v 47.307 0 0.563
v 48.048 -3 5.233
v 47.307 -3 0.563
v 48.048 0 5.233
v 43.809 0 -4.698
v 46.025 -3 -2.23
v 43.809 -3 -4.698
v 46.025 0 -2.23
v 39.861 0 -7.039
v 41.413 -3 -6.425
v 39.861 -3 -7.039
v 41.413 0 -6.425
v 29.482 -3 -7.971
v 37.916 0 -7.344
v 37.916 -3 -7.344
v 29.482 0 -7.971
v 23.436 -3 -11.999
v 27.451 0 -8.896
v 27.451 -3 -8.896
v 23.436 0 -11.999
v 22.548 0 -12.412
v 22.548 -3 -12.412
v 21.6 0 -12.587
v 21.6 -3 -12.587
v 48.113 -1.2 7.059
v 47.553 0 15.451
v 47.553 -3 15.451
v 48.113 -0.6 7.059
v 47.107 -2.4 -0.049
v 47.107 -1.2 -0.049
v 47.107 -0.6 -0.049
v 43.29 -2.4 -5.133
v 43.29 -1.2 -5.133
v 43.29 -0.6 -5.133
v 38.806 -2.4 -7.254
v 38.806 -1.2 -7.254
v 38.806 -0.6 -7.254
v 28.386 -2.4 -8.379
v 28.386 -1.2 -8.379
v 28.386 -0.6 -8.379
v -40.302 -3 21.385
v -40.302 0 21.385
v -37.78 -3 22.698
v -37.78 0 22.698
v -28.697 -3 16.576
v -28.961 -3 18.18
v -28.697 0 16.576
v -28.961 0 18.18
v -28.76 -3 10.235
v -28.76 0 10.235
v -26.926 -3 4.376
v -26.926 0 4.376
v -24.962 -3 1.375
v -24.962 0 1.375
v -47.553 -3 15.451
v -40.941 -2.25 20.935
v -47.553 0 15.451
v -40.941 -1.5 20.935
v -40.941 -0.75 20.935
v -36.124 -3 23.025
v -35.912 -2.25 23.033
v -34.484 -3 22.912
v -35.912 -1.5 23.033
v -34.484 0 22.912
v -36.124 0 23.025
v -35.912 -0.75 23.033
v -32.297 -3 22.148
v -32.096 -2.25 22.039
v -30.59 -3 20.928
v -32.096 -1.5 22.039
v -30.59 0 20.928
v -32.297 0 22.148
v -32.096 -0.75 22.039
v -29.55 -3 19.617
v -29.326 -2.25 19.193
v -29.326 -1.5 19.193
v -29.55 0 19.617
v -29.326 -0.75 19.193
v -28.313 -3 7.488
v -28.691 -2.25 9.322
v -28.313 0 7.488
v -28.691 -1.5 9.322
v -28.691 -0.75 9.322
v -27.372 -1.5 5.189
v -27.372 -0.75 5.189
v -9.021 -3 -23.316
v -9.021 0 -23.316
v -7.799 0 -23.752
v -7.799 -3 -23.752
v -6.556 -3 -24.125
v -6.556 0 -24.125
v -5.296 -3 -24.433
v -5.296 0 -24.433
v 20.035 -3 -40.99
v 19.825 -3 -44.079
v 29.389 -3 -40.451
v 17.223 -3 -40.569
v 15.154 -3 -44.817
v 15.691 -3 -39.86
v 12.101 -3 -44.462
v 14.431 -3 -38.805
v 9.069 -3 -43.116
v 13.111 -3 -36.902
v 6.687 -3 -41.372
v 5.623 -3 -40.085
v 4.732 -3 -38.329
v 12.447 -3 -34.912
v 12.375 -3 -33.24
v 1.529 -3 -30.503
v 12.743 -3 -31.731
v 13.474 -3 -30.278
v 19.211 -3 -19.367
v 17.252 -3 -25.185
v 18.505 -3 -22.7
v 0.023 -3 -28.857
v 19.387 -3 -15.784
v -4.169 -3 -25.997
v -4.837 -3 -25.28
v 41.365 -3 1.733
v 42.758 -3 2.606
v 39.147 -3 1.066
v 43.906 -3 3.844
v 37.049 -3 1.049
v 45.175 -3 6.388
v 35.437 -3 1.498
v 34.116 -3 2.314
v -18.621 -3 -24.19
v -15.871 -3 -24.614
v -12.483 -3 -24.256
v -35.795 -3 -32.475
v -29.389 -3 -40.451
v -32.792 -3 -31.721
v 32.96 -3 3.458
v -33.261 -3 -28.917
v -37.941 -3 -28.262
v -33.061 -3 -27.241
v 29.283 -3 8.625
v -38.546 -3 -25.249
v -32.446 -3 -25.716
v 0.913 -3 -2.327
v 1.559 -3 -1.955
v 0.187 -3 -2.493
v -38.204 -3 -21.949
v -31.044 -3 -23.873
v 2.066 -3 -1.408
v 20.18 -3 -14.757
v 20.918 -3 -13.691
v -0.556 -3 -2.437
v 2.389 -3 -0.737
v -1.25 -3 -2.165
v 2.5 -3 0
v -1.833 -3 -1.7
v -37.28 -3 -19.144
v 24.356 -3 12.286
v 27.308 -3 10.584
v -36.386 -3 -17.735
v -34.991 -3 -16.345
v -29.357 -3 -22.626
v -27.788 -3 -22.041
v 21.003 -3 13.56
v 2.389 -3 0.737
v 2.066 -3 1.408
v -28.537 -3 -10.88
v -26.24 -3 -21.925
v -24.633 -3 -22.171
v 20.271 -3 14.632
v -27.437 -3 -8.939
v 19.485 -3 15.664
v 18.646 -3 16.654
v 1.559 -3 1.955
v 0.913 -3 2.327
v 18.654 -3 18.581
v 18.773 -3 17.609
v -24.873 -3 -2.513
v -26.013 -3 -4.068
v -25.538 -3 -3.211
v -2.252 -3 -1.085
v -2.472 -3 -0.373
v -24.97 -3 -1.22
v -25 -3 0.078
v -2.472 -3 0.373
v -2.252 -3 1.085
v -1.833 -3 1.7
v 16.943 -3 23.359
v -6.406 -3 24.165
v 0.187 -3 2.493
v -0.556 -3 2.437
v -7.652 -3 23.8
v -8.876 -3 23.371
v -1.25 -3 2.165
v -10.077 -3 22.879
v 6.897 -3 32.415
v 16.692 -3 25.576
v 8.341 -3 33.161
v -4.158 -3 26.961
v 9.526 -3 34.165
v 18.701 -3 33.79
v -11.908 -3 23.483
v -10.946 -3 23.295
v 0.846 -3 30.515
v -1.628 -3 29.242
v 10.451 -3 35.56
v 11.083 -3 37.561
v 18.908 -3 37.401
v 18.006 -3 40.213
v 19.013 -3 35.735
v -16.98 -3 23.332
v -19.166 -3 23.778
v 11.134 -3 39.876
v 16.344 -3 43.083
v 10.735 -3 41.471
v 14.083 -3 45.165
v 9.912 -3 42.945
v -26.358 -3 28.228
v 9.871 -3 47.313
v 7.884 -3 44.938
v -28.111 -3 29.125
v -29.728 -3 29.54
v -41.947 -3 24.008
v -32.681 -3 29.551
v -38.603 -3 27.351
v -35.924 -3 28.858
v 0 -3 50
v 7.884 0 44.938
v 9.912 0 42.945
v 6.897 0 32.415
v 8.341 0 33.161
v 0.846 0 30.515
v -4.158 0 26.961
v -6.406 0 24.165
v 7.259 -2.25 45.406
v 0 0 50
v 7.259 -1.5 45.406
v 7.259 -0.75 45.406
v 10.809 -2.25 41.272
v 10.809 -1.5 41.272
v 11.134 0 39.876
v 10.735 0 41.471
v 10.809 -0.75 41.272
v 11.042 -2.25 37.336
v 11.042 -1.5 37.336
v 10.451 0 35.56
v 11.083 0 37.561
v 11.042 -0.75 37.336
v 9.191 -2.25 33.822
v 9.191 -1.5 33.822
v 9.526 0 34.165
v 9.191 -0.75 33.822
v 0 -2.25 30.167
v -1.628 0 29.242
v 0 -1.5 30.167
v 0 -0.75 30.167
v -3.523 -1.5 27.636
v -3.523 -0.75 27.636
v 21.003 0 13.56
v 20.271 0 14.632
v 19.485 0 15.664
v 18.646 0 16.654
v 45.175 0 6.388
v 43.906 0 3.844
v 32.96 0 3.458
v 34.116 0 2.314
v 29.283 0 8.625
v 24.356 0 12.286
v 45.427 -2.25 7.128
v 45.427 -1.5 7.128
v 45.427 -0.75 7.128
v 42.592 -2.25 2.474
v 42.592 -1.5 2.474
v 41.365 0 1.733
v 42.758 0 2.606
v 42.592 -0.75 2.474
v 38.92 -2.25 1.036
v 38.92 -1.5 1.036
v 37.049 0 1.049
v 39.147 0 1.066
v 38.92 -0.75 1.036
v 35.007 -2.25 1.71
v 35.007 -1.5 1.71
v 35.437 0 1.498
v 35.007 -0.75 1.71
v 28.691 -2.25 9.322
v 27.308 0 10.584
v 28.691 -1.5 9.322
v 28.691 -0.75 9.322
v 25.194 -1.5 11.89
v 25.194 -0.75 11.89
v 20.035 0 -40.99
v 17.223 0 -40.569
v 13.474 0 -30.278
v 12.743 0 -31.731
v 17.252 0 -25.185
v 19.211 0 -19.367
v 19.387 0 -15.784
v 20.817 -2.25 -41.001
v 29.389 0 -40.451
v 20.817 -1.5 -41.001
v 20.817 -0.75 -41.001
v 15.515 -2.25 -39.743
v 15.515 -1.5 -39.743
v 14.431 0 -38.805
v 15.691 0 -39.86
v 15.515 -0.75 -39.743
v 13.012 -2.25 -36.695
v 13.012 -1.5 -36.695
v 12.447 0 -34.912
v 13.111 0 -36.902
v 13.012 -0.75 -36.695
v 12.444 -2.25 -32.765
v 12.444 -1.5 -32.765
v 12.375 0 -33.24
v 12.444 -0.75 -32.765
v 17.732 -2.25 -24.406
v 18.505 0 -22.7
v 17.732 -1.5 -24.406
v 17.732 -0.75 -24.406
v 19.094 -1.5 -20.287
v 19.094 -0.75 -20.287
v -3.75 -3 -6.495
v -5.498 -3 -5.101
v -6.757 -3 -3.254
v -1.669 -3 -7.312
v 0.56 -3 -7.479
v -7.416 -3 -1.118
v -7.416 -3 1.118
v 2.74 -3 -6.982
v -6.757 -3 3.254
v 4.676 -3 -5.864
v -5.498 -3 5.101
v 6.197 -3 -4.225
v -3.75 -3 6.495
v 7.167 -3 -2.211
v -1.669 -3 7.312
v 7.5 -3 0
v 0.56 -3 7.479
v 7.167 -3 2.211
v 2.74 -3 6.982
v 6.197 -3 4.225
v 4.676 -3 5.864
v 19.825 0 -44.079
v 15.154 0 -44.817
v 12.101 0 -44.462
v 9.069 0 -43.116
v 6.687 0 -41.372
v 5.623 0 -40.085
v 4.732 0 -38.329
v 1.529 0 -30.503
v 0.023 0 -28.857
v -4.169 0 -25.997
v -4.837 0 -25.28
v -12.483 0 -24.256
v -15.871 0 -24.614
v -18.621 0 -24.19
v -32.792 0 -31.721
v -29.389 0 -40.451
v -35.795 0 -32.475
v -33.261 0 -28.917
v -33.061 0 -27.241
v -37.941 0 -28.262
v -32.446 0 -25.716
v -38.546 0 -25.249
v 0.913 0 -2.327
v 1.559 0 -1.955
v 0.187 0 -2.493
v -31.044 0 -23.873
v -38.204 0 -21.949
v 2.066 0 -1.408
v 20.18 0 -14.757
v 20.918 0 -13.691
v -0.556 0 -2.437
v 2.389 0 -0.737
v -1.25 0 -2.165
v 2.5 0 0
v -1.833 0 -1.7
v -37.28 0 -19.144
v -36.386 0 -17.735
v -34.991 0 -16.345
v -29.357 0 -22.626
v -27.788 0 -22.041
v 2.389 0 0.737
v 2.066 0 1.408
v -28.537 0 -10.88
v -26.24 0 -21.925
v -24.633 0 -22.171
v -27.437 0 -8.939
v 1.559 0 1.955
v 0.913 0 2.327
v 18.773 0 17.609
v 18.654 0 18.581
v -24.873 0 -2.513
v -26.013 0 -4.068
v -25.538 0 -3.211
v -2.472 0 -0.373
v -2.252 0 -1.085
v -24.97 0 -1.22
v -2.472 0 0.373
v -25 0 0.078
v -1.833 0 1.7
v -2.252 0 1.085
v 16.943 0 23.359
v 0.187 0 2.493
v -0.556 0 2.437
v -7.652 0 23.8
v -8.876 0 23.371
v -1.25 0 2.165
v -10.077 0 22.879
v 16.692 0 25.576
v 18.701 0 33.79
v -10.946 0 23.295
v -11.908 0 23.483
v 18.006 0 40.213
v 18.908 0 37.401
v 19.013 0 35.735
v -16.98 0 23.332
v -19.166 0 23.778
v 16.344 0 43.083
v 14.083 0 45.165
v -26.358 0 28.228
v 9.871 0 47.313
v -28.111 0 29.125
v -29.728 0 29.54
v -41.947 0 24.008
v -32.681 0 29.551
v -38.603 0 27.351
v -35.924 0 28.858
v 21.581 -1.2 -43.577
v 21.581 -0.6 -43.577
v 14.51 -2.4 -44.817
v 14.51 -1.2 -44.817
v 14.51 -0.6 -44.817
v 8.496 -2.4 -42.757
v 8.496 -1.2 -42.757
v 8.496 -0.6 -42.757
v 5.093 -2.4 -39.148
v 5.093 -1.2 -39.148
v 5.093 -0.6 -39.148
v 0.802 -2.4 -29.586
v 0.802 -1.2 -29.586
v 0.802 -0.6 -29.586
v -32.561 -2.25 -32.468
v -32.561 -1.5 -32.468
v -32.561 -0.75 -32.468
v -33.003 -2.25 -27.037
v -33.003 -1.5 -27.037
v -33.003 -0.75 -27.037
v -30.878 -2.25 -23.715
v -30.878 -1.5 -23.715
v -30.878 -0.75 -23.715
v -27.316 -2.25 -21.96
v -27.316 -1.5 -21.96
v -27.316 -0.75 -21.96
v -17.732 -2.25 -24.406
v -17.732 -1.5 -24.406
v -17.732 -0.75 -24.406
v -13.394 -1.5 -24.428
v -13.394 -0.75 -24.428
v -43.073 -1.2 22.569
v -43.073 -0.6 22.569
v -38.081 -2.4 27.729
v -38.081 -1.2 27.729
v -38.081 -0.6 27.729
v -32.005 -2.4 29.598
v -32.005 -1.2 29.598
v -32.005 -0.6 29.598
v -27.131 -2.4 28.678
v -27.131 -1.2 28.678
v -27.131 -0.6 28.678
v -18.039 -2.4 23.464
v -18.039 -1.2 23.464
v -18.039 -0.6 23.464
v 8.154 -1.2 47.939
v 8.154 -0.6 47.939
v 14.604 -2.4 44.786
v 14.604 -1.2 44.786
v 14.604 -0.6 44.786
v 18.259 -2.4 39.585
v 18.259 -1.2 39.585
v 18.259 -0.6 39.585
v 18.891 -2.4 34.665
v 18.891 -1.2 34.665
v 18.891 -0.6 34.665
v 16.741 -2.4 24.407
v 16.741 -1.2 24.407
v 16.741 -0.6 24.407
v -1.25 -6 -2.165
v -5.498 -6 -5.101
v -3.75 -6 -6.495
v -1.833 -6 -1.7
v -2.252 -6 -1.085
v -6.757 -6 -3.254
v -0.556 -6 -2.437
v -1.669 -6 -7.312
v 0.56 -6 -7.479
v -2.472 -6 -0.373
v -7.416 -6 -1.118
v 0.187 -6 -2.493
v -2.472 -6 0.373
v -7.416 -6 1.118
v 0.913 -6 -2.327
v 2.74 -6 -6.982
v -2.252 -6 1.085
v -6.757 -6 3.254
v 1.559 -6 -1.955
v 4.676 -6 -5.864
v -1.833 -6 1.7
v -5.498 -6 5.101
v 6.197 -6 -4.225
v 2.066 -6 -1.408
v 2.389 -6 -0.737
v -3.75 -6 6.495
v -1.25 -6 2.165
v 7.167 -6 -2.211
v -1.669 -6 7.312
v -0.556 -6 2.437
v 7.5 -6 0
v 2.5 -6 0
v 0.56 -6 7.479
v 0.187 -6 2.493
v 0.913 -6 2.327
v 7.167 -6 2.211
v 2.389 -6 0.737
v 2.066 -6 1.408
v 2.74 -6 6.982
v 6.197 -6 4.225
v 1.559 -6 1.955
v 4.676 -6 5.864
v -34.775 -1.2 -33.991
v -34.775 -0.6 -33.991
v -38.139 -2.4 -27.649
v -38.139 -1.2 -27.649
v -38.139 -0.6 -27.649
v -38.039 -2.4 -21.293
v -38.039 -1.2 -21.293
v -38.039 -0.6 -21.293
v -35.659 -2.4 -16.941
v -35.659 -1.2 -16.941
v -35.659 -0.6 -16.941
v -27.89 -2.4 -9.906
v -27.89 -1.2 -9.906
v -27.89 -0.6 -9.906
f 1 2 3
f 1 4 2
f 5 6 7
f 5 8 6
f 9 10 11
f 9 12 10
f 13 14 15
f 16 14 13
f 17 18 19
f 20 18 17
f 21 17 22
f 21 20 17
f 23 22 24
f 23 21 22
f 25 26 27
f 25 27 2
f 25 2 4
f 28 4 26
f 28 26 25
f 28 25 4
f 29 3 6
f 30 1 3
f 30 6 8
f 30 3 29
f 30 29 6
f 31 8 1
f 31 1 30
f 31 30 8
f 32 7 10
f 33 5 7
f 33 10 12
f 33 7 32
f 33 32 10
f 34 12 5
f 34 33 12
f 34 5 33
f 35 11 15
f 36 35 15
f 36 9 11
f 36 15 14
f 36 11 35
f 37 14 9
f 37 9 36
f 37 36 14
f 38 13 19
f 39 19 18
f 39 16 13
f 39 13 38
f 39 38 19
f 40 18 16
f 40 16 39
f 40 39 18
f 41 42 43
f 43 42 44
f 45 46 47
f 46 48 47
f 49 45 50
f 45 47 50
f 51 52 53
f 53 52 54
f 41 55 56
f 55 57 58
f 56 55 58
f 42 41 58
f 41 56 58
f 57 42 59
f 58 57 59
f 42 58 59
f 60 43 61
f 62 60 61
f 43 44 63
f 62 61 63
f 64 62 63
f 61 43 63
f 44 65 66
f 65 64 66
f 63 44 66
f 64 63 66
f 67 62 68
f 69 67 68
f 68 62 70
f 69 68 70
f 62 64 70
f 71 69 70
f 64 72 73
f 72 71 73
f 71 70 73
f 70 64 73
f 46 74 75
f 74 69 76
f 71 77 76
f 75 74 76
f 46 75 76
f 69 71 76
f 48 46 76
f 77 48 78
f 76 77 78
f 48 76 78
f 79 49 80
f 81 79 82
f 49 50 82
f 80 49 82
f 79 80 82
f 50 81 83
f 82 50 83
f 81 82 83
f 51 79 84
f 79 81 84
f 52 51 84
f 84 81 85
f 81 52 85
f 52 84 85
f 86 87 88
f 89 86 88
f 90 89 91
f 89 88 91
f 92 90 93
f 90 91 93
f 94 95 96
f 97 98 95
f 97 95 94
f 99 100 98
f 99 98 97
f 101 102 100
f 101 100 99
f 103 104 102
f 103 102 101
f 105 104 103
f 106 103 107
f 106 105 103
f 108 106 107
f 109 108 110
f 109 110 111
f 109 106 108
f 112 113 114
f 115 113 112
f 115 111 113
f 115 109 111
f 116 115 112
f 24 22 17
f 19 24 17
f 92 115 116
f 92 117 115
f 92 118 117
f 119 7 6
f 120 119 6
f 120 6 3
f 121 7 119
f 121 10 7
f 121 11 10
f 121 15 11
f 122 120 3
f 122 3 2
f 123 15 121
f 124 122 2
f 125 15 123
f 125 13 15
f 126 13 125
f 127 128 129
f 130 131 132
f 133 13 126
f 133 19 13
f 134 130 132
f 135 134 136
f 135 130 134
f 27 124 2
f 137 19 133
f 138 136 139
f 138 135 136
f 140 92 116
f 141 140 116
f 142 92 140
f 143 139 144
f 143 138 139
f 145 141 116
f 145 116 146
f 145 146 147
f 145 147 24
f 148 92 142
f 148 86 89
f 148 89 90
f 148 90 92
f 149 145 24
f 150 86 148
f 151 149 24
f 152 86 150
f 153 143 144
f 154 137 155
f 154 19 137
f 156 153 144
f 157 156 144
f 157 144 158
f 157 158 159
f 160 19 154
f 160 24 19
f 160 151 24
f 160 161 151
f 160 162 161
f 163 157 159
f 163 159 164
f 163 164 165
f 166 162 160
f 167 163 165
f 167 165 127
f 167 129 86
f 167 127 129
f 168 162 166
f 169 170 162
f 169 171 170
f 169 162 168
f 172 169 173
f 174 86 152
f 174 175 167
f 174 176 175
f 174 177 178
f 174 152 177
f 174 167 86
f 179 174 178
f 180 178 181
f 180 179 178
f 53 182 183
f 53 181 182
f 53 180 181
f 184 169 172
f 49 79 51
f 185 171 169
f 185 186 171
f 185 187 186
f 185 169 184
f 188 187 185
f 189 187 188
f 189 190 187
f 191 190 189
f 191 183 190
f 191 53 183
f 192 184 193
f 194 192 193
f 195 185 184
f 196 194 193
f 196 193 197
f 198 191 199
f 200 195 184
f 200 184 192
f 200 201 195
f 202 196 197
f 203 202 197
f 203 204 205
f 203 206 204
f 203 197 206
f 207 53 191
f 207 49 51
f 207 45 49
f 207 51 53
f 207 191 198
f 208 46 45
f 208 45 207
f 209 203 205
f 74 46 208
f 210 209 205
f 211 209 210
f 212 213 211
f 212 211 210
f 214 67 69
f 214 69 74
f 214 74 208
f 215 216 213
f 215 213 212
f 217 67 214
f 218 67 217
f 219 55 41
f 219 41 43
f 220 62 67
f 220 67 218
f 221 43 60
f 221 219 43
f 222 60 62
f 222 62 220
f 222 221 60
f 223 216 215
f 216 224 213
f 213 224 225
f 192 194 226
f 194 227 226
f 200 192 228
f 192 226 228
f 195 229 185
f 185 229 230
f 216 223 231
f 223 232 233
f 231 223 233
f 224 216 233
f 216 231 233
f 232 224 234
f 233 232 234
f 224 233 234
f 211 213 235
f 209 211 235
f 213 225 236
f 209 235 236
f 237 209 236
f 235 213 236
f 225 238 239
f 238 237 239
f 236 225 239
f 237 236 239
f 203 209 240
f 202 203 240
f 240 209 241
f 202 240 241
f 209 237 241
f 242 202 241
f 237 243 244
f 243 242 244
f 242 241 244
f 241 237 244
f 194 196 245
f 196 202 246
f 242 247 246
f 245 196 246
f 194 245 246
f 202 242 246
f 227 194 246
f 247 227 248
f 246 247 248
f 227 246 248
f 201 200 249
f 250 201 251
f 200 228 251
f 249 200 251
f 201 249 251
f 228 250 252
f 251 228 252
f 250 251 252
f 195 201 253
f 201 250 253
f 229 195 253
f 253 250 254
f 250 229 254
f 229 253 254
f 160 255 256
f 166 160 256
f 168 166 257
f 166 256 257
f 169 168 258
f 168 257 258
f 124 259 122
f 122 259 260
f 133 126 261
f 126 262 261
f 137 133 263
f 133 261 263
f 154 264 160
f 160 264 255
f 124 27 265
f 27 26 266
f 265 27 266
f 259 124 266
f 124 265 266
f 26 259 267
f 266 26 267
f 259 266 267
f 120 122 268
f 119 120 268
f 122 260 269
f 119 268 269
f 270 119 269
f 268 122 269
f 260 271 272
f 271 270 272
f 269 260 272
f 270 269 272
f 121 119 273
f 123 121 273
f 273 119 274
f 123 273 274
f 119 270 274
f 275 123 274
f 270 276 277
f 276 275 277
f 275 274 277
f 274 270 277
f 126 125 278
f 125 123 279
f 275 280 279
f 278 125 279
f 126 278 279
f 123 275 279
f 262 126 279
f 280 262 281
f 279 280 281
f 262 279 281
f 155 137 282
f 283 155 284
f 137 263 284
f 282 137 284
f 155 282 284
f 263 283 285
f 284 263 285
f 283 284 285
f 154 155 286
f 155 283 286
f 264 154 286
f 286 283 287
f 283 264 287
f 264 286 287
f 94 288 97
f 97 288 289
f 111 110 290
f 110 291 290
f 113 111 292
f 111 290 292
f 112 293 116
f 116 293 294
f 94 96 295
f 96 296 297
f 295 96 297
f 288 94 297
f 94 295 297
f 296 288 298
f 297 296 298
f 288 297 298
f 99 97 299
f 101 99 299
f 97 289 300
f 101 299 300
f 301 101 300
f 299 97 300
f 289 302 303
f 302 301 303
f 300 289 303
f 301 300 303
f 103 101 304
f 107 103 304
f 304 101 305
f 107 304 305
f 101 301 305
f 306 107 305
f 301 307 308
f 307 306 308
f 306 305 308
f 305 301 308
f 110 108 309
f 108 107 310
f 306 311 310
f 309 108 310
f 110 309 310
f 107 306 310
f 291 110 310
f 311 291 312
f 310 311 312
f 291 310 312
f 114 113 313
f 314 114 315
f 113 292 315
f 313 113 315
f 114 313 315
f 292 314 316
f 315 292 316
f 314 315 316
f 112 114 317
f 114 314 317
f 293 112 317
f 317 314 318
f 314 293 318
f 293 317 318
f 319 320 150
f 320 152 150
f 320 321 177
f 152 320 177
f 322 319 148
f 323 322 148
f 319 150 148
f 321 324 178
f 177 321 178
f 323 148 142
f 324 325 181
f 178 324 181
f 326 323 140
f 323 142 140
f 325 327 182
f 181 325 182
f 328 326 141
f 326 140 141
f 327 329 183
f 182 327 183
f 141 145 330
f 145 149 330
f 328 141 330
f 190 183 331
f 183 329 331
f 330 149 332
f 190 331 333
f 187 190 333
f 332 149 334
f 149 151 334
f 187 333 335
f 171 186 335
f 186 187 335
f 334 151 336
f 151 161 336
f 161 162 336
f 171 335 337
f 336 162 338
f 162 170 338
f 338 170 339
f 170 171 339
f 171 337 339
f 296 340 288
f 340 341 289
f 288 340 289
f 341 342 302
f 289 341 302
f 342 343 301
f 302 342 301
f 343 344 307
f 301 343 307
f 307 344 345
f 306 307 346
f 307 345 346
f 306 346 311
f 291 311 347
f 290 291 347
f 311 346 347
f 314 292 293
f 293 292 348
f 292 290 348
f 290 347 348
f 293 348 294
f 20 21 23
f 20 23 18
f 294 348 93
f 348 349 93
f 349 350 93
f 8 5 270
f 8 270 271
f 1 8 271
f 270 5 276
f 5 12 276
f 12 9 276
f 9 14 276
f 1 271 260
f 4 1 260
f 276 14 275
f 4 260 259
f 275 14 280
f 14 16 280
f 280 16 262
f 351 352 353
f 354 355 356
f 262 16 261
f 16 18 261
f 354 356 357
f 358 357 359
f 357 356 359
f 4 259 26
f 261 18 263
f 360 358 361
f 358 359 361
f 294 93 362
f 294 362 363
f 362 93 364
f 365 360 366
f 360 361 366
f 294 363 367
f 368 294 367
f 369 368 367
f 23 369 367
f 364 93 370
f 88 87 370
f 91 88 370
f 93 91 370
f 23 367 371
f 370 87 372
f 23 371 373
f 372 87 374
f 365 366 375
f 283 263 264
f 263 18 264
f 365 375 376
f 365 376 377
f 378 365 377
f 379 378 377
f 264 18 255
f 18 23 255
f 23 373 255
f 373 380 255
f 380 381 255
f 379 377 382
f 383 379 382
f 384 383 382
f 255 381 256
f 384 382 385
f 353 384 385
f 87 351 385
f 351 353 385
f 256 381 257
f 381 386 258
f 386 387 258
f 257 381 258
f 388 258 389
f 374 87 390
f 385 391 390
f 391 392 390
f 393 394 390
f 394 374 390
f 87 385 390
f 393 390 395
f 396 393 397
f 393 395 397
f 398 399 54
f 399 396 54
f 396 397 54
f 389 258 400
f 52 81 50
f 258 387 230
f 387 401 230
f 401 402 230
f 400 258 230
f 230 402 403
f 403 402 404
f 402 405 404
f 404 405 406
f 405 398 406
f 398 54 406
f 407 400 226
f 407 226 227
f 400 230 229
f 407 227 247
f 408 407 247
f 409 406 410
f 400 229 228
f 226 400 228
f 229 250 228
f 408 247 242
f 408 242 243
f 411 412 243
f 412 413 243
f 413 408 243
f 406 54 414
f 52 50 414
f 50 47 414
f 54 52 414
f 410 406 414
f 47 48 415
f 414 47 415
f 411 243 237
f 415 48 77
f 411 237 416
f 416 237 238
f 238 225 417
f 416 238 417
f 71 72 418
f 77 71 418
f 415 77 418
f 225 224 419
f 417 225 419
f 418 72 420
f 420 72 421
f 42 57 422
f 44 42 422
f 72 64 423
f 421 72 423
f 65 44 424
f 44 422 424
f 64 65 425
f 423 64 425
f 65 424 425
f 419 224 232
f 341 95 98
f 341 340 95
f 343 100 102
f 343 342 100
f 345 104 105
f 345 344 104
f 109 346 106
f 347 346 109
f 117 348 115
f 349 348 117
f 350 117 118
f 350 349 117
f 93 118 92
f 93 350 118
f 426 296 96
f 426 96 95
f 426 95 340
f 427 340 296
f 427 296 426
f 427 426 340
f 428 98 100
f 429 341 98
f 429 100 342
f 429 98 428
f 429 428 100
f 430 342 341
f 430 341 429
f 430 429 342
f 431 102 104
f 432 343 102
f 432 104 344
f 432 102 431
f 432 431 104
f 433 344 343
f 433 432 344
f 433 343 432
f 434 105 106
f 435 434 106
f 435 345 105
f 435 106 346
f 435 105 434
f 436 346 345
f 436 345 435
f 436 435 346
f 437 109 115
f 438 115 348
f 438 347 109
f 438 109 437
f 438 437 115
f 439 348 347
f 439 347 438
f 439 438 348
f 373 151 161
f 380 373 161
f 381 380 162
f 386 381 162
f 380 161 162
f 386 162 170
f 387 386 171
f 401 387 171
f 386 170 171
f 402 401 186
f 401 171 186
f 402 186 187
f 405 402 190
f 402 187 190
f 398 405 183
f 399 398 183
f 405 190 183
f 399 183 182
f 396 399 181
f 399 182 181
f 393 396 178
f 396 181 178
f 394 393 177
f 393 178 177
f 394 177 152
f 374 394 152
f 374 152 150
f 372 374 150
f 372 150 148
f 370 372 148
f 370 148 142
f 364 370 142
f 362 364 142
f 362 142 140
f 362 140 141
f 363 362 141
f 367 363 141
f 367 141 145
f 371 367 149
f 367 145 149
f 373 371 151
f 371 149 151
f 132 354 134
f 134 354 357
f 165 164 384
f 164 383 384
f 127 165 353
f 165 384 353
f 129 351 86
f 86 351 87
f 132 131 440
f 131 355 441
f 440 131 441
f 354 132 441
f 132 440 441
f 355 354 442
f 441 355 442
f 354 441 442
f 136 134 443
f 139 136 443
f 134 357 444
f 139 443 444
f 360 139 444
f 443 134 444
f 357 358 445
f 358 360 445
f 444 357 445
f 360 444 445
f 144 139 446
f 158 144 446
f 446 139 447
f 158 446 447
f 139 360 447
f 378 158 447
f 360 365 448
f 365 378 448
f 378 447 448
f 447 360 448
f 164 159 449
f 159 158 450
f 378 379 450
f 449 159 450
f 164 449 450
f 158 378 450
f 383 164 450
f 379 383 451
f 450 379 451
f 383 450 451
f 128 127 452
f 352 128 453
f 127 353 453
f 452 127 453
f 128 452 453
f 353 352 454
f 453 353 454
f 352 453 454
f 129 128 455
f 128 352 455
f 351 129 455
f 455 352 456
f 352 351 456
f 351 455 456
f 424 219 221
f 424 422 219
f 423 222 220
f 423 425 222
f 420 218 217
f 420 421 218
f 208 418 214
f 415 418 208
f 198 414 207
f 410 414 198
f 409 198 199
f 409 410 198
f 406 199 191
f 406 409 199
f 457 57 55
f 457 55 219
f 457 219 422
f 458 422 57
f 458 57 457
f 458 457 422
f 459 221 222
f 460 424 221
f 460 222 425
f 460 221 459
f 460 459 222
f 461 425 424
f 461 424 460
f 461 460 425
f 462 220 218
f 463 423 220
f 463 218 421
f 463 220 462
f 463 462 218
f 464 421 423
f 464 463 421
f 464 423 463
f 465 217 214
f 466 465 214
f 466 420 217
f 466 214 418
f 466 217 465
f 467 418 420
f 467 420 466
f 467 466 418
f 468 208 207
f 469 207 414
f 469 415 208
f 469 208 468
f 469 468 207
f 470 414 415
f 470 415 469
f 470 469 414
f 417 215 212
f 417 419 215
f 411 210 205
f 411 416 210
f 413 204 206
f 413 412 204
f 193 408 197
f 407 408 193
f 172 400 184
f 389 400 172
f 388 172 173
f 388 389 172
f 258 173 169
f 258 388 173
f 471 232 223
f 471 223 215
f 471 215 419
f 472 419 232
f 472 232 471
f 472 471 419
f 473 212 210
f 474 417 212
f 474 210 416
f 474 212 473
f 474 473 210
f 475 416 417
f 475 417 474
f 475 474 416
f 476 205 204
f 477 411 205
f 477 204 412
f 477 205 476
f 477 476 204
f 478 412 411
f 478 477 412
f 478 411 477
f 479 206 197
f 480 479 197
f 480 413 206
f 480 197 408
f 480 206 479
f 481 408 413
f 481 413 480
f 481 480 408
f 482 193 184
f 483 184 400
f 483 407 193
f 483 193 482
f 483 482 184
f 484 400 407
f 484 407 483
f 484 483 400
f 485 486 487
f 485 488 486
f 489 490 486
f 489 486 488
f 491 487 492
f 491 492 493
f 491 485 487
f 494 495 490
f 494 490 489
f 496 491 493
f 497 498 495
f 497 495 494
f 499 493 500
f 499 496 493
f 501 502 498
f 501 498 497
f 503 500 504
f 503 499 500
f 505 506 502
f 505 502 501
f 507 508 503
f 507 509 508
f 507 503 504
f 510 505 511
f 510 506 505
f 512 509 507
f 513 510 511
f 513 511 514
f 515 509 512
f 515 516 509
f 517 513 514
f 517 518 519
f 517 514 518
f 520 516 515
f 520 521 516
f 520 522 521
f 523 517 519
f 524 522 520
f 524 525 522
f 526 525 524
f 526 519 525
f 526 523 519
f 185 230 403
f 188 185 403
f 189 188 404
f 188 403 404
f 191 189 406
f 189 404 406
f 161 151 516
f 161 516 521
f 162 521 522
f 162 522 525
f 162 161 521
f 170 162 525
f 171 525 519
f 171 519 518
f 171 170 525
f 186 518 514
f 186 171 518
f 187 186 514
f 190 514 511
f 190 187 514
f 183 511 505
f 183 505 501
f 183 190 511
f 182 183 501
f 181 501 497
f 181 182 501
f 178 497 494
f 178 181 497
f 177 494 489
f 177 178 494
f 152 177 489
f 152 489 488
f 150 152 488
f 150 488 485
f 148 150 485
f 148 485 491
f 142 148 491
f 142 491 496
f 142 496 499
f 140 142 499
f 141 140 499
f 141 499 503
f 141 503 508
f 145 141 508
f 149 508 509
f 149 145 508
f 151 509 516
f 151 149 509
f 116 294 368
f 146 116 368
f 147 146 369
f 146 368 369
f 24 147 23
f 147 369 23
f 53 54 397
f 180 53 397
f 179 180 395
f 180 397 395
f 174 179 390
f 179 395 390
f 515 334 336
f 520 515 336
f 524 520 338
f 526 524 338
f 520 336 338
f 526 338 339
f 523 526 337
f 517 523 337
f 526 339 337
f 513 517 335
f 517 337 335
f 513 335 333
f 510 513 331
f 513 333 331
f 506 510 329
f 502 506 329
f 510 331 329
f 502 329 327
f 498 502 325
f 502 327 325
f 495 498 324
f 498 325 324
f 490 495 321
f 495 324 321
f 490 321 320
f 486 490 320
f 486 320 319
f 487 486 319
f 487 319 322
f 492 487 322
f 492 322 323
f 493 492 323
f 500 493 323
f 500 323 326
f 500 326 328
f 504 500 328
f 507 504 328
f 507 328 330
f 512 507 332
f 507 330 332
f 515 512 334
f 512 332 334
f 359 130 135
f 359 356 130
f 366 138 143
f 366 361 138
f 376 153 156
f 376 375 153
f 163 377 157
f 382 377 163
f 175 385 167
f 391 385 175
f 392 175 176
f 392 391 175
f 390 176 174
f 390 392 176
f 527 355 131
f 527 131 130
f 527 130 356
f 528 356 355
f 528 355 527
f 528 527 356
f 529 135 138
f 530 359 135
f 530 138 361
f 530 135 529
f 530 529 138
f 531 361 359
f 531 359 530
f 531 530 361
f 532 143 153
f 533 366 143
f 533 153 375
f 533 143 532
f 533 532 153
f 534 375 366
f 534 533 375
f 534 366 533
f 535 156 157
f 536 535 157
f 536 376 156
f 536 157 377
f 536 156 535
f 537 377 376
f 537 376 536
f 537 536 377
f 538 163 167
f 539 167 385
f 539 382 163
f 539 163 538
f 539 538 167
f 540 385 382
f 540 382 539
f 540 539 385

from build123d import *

# Parameters (mm, degrees)
F1_DEPTH = 3
F3_COUNT = 5
F4_R     = 2.5
F5_DEPTH = 3
F7_R     = 7.5
F7_R_2   = 2.5
F8_DEPTH = 3


with BuildPart() as f1:
    # F0 (on Front) → F1 (new body)
    with BuildSketch(Plane.XZ):
        with BuildLine():
            ThreePointArc((-6.4064275077, 24.1652164606), (7.1802315771, 23.9466965258), (18.6456198428, 16.6535539954))
            add(Edge.make_bspline(
                [(0, 50), (5.4752053314, 48.9870299865), (15.1956288518, 46.1472010196), (18.4135211284, 39.657308755), (19.7986928673, 34.5709188014), (14.5438348398, 24.2751019543), (19.322329273, 19.0016283629), (18.6456198428, 16.6535539954)],
                knots=[0, 0, 0, 0, 0.2669854229, 0.4379263337, 0.5889285558, 0.8084269905, 1, 1, 1, 1], degree=3))
            add(Edge.make_bspline(
                [(0, 50), (6.0767503455, 46.164855361), (12.3433645668, 43.2573090849), (10.5437457987, 31.9559472859), (-0.898028492, 31.2765938229), (-4.5042521994, 26.6763451486), (-6.4064275077, 24.1652164606)],
                knots=[0, 0, 0, 0, 0.29590245, 0.5151018296, 0.7647825177, 1, 1, 1, 1], degree=3))
        make_face()
        with BuildLine():
            ThreePointArc((-6.4064275077, 24.1652164606), (-15.2453158758, -19.8136403482), (25, 0))
            ThreePointArc((25, 0), (23.3574452378, 8.9123370653), (18.6456198428, 16.6535539954))
            ThreePointArc((18.6456198428, 16.6535539954), (7.1802315771, 23.9466965258), (-6.4064275077, 24.1652164606))
        make_face()
    extrude(amount=F1_DEPTH)


with BuildPart() as f3_1:
    # F3: instance of F1
    add(f1.part.rotate(Axis((0, 4.5021800324, 0), (0, 1, 0)), 1 * 360 / F3_COUNT))


with BuildPart() as f3_2:
    # F3: instance of F1
    add(f1.part.rotate(Axis((0, 4.5021800324, 0), (0, 1, 0)), 2 * 360 / F3_COUNT))


with BuildPart() as f3_3:
    # F3: instance of F1
    add(f1.part.rotate(Axis((0, 4.5021800324, 0), (0, 1, 0)), 3 * 360 / F3_COUNT))


with BuildPart() as f3_4:
    # F3: instance of F1
    add(f1.part.rotate(Axis((0, 4.5021800324, 0), (0, 1, 0)), 4 * 360 / F3_COUNT))


with BuildPart() as f5_tool:
    # F4 (on face) → F5 (new body, through all)
    with BuildSketch(Plane.XZ.offset(3)):
        Circle(F4_R)
    extrude(amount=-F5_DEPTH)


with BuildPart() as f1_1:
    add(f1.part)

    # F5: cut by f5_tool
    add(f5_tool.part, mode=Mode.SUBTRACT)


with BuildPart() as f3_1_1:
    add(f3_1.part)

    # F5: cut by f5_tool
    add(f5_tool.part, mode=Mode.SUBTRACT)


with BuildPart() as f3_2_1:
    add(f3_2.part)

    # F5: cut by f5_tool
    add(f5_tool.part, mode=Mode.SUBTRACT)


with BuildPart() as f3_3_1:
    add(f3_3.part)

    # F5: cut by f5_tool
    add(f5_tool.part, mode=Mode.SUBTRACT)


with BuildPart() as f3_4_1:
    add(f3_4.part)

    # F5: cut by f5_tool
    add(f5_tool.part, mode=Mode.SUBTRACT)


with BuildPart() as f1_2:
    add(f1_1.part)

    # F6: union F3_1, F3_2, F3_3, F3_4
    add(f3_1_1.part)
    add(f3_2_1.part)
    add(f3_3_1.part)
    add(f3_4_1.part)


with BuildPart() as f8:
    # F7 (on face) → F8 (new body)
    with BuildSketch(Plane.XZ.offset(3)):
        Circle(F7_R)
        Circle(F7_R_2, mode=Mode.SUBTRACT)
    extrude(amount=F8_DEPTH)


solid = Compound([f1_2.part, f8.part])
